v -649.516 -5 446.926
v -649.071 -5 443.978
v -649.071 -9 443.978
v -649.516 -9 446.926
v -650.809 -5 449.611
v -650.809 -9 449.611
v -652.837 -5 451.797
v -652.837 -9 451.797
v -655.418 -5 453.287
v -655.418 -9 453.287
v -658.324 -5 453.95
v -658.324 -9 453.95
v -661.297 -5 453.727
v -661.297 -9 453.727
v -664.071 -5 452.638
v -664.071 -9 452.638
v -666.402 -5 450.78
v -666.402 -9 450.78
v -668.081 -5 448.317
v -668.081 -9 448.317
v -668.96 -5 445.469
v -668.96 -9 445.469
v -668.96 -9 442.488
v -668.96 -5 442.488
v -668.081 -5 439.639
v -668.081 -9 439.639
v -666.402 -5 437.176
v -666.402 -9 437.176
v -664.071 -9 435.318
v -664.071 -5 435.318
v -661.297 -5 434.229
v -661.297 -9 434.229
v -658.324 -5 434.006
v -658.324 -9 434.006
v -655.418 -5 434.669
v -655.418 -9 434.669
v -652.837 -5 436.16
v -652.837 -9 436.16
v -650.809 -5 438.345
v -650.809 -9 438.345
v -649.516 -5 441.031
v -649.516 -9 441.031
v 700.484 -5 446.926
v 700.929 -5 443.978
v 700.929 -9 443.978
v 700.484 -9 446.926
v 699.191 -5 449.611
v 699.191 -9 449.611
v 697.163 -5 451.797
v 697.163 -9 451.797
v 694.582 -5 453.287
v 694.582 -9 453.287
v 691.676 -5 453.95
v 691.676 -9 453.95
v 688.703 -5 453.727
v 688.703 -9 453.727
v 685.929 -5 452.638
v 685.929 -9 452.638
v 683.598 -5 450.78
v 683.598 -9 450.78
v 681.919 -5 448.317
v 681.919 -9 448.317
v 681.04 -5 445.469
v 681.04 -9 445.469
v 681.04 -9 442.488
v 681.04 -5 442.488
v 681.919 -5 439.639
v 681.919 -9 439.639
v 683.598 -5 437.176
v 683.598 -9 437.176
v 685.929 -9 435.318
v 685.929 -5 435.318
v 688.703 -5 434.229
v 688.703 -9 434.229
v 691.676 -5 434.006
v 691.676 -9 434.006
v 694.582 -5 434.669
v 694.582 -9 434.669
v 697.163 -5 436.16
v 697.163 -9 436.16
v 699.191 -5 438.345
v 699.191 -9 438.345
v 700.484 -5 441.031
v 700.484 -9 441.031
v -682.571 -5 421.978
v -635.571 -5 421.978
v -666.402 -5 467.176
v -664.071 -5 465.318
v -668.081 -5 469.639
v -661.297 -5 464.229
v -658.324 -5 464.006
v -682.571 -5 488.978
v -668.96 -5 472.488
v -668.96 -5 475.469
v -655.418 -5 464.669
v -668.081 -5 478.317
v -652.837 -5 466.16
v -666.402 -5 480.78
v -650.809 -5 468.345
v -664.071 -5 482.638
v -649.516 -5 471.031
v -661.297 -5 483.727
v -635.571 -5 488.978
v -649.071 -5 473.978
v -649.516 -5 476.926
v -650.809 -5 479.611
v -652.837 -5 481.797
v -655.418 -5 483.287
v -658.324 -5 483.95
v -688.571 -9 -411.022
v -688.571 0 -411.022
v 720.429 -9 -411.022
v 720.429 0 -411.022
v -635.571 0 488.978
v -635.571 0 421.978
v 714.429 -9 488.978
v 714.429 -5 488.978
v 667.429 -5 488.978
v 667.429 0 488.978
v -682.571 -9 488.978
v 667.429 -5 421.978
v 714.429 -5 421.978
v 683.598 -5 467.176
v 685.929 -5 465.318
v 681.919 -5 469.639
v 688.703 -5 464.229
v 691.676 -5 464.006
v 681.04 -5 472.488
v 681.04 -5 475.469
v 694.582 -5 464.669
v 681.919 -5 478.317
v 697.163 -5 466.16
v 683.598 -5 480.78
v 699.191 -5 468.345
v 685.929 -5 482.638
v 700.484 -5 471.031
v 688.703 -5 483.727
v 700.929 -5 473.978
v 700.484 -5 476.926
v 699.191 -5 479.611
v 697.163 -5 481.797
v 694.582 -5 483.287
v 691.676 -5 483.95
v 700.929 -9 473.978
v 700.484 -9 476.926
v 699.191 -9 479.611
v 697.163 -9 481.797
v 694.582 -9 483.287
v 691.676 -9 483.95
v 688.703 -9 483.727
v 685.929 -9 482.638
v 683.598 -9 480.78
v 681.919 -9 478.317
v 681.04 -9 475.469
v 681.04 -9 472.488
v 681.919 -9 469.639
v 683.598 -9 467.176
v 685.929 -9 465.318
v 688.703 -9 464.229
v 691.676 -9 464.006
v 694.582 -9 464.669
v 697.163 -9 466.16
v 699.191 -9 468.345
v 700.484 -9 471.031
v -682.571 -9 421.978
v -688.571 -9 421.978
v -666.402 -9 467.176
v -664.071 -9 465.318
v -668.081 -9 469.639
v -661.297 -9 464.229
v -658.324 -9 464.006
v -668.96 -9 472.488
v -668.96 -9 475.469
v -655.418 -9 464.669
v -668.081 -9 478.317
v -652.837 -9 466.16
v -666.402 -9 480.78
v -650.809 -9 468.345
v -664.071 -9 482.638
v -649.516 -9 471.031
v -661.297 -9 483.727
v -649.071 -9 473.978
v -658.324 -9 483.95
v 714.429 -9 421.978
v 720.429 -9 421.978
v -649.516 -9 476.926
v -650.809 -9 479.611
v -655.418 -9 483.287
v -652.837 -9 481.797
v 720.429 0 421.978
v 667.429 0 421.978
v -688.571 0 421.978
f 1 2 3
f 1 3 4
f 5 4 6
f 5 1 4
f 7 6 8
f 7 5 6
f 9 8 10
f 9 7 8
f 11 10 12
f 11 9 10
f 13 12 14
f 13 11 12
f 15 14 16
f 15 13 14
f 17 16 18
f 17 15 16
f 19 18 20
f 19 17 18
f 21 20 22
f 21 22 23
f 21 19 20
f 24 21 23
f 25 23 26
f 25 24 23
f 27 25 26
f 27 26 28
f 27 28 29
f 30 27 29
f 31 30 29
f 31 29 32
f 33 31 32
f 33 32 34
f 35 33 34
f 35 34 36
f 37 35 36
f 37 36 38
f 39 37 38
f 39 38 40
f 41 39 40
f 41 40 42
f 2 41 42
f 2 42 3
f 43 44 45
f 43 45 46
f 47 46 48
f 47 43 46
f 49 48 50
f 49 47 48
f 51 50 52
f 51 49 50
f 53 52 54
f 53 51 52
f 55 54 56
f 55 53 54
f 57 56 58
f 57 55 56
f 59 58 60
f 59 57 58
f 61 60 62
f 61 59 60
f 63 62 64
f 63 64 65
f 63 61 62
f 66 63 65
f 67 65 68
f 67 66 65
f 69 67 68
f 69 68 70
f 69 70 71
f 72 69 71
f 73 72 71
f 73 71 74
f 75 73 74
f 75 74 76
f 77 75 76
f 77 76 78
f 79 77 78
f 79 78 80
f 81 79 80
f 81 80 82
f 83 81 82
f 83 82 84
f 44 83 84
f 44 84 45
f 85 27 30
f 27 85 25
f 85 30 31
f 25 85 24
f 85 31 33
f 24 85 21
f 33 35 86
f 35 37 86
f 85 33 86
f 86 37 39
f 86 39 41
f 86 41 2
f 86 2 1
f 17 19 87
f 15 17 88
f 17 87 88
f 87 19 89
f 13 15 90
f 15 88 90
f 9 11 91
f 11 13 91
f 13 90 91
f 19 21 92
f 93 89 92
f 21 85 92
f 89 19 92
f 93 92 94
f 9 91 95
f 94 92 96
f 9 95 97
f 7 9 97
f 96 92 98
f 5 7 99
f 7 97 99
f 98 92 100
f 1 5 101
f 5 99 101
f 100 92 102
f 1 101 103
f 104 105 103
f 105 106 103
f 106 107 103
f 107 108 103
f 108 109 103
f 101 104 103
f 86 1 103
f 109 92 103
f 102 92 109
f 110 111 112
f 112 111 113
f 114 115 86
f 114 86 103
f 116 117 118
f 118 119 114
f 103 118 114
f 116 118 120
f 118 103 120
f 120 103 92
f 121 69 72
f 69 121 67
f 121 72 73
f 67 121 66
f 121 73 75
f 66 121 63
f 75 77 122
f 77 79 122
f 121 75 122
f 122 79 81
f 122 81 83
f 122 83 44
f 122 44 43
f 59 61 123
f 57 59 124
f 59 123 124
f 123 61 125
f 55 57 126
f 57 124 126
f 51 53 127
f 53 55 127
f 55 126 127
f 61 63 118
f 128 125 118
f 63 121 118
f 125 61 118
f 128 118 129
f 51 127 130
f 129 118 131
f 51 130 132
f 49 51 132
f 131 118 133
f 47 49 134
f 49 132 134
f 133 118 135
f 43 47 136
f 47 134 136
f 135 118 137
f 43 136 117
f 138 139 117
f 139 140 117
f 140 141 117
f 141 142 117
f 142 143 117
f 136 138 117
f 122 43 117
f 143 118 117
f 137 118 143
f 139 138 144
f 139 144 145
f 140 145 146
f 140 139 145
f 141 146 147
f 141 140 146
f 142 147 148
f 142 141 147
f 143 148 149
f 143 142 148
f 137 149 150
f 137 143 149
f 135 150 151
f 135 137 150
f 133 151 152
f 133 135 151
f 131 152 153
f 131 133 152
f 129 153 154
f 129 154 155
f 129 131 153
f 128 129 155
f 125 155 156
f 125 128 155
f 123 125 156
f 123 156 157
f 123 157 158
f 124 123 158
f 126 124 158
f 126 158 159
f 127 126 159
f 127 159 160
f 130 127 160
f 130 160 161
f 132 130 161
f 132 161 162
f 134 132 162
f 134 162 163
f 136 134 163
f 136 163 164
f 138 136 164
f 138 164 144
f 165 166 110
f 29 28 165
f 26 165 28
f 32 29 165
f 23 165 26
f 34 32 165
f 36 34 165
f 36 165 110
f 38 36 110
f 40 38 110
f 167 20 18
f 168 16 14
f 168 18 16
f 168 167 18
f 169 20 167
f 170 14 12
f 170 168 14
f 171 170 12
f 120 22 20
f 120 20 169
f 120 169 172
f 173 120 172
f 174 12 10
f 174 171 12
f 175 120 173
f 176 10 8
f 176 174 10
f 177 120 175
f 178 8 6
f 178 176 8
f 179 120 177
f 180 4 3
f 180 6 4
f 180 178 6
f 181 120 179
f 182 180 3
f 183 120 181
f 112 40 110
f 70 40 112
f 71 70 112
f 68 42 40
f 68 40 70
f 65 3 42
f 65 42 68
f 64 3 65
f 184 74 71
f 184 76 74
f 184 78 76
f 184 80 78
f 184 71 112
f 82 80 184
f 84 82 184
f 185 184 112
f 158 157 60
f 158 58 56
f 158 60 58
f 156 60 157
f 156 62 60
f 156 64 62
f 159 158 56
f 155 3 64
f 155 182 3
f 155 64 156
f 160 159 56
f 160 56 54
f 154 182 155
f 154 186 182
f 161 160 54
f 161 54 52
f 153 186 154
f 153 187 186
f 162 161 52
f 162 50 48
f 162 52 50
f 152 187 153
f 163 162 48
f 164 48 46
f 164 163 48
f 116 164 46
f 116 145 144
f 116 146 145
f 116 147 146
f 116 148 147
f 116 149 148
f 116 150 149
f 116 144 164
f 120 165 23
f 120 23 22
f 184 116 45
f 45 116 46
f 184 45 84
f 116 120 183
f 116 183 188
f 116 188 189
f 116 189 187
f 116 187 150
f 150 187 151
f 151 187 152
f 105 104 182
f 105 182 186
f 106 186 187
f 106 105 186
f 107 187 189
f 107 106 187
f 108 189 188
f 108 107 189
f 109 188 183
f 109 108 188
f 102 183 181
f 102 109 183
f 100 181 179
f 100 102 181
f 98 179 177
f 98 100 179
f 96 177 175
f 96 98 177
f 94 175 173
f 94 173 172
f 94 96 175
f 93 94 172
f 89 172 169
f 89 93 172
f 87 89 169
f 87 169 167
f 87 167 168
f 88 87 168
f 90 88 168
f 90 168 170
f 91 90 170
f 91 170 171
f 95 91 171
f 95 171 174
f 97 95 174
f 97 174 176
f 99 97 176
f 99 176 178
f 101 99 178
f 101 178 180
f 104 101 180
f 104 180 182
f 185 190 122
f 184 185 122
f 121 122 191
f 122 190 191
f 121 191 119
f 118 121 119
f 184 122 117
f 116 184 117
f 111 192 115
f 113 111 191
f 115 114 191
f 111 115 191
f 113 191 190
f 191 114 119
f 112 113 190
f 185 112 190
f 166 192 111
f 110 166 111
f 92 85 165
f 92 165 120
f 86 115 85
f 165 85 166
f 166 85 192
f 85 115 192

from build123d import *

# Parameters (mm, degrees)
F0_W     = 47
F0_H     = 67
F0_R     = 10
F1_DEPTH = 9
F2_DEPTH = 5


with BuildPart() as f1:
    # F0 (on Front) → F1 (new body)
    with BuildSketch(Plane.XZ):
        Polygon((667.428573, 488.978206), (-635.571427, 488.978206), (-635.571427, 421.978206), (-682.571427, 421.978206), (-688.571427, 421.978206), (-688.571427, -411.021794), (720.428573, -411.021794), (720.428573, 421.978206), (714.428573, 421.978206), (667.428573, 421.978206), align=None)
        with Locations((-659.071427, 455.478206)):
            Rectangle(F0_W, F0_H)
        with Locations((-659.071427, 443.978206)):
            Circle(F0_R, mode=Mode.SUBTRACT)
        with Locations((-659.071427, 473.978206)):
            Circle(F0_R, mode=Mode.SUBTRACT)
        with Locations((690.928573, 455.478206)):
            Rectangle(F0_W, F0_H)
        with Locations((690.928573, 443.978206)):
            Circle(F0_R, mode=Mode.SUBTRACT)
        with Locations((690.928573, 473.978206)):
            Circle(F0_R, mode=Mode.SUBTRACT)
    extrude(amount=F1_DEPTH)

    # F0 (on Front) → F2 (cut)
    with BuildSketch(Plane.XZ):
        with Locations((-659.071427, 455.478206)):
            Rectangle(F0_W, F0_H)
        with Locations((-659.071427, 443.978206)):
            Circle(F0_R, mode=Mode.SUBTRACT)
        with Locations((-659.071427, 473.978206)):
            Circle(F0_R, mode=Mode.SUBTRACT)
        with Locations((690.928573, 455.478206)):
            Rectangle(F0_W, F0_H)
        with Locations((690.928573, 443.978206)):
            Circle(F0_R, mode=Mode.SUBTRACT)
        with Locations((690.928573, 473.978206)):
            Circle(F0_R, mode=Mode.SUBTRACT)
    extrude(amount=F2_DEPTH, mode=Mode.SUBTRACT)


solid = f1.part
